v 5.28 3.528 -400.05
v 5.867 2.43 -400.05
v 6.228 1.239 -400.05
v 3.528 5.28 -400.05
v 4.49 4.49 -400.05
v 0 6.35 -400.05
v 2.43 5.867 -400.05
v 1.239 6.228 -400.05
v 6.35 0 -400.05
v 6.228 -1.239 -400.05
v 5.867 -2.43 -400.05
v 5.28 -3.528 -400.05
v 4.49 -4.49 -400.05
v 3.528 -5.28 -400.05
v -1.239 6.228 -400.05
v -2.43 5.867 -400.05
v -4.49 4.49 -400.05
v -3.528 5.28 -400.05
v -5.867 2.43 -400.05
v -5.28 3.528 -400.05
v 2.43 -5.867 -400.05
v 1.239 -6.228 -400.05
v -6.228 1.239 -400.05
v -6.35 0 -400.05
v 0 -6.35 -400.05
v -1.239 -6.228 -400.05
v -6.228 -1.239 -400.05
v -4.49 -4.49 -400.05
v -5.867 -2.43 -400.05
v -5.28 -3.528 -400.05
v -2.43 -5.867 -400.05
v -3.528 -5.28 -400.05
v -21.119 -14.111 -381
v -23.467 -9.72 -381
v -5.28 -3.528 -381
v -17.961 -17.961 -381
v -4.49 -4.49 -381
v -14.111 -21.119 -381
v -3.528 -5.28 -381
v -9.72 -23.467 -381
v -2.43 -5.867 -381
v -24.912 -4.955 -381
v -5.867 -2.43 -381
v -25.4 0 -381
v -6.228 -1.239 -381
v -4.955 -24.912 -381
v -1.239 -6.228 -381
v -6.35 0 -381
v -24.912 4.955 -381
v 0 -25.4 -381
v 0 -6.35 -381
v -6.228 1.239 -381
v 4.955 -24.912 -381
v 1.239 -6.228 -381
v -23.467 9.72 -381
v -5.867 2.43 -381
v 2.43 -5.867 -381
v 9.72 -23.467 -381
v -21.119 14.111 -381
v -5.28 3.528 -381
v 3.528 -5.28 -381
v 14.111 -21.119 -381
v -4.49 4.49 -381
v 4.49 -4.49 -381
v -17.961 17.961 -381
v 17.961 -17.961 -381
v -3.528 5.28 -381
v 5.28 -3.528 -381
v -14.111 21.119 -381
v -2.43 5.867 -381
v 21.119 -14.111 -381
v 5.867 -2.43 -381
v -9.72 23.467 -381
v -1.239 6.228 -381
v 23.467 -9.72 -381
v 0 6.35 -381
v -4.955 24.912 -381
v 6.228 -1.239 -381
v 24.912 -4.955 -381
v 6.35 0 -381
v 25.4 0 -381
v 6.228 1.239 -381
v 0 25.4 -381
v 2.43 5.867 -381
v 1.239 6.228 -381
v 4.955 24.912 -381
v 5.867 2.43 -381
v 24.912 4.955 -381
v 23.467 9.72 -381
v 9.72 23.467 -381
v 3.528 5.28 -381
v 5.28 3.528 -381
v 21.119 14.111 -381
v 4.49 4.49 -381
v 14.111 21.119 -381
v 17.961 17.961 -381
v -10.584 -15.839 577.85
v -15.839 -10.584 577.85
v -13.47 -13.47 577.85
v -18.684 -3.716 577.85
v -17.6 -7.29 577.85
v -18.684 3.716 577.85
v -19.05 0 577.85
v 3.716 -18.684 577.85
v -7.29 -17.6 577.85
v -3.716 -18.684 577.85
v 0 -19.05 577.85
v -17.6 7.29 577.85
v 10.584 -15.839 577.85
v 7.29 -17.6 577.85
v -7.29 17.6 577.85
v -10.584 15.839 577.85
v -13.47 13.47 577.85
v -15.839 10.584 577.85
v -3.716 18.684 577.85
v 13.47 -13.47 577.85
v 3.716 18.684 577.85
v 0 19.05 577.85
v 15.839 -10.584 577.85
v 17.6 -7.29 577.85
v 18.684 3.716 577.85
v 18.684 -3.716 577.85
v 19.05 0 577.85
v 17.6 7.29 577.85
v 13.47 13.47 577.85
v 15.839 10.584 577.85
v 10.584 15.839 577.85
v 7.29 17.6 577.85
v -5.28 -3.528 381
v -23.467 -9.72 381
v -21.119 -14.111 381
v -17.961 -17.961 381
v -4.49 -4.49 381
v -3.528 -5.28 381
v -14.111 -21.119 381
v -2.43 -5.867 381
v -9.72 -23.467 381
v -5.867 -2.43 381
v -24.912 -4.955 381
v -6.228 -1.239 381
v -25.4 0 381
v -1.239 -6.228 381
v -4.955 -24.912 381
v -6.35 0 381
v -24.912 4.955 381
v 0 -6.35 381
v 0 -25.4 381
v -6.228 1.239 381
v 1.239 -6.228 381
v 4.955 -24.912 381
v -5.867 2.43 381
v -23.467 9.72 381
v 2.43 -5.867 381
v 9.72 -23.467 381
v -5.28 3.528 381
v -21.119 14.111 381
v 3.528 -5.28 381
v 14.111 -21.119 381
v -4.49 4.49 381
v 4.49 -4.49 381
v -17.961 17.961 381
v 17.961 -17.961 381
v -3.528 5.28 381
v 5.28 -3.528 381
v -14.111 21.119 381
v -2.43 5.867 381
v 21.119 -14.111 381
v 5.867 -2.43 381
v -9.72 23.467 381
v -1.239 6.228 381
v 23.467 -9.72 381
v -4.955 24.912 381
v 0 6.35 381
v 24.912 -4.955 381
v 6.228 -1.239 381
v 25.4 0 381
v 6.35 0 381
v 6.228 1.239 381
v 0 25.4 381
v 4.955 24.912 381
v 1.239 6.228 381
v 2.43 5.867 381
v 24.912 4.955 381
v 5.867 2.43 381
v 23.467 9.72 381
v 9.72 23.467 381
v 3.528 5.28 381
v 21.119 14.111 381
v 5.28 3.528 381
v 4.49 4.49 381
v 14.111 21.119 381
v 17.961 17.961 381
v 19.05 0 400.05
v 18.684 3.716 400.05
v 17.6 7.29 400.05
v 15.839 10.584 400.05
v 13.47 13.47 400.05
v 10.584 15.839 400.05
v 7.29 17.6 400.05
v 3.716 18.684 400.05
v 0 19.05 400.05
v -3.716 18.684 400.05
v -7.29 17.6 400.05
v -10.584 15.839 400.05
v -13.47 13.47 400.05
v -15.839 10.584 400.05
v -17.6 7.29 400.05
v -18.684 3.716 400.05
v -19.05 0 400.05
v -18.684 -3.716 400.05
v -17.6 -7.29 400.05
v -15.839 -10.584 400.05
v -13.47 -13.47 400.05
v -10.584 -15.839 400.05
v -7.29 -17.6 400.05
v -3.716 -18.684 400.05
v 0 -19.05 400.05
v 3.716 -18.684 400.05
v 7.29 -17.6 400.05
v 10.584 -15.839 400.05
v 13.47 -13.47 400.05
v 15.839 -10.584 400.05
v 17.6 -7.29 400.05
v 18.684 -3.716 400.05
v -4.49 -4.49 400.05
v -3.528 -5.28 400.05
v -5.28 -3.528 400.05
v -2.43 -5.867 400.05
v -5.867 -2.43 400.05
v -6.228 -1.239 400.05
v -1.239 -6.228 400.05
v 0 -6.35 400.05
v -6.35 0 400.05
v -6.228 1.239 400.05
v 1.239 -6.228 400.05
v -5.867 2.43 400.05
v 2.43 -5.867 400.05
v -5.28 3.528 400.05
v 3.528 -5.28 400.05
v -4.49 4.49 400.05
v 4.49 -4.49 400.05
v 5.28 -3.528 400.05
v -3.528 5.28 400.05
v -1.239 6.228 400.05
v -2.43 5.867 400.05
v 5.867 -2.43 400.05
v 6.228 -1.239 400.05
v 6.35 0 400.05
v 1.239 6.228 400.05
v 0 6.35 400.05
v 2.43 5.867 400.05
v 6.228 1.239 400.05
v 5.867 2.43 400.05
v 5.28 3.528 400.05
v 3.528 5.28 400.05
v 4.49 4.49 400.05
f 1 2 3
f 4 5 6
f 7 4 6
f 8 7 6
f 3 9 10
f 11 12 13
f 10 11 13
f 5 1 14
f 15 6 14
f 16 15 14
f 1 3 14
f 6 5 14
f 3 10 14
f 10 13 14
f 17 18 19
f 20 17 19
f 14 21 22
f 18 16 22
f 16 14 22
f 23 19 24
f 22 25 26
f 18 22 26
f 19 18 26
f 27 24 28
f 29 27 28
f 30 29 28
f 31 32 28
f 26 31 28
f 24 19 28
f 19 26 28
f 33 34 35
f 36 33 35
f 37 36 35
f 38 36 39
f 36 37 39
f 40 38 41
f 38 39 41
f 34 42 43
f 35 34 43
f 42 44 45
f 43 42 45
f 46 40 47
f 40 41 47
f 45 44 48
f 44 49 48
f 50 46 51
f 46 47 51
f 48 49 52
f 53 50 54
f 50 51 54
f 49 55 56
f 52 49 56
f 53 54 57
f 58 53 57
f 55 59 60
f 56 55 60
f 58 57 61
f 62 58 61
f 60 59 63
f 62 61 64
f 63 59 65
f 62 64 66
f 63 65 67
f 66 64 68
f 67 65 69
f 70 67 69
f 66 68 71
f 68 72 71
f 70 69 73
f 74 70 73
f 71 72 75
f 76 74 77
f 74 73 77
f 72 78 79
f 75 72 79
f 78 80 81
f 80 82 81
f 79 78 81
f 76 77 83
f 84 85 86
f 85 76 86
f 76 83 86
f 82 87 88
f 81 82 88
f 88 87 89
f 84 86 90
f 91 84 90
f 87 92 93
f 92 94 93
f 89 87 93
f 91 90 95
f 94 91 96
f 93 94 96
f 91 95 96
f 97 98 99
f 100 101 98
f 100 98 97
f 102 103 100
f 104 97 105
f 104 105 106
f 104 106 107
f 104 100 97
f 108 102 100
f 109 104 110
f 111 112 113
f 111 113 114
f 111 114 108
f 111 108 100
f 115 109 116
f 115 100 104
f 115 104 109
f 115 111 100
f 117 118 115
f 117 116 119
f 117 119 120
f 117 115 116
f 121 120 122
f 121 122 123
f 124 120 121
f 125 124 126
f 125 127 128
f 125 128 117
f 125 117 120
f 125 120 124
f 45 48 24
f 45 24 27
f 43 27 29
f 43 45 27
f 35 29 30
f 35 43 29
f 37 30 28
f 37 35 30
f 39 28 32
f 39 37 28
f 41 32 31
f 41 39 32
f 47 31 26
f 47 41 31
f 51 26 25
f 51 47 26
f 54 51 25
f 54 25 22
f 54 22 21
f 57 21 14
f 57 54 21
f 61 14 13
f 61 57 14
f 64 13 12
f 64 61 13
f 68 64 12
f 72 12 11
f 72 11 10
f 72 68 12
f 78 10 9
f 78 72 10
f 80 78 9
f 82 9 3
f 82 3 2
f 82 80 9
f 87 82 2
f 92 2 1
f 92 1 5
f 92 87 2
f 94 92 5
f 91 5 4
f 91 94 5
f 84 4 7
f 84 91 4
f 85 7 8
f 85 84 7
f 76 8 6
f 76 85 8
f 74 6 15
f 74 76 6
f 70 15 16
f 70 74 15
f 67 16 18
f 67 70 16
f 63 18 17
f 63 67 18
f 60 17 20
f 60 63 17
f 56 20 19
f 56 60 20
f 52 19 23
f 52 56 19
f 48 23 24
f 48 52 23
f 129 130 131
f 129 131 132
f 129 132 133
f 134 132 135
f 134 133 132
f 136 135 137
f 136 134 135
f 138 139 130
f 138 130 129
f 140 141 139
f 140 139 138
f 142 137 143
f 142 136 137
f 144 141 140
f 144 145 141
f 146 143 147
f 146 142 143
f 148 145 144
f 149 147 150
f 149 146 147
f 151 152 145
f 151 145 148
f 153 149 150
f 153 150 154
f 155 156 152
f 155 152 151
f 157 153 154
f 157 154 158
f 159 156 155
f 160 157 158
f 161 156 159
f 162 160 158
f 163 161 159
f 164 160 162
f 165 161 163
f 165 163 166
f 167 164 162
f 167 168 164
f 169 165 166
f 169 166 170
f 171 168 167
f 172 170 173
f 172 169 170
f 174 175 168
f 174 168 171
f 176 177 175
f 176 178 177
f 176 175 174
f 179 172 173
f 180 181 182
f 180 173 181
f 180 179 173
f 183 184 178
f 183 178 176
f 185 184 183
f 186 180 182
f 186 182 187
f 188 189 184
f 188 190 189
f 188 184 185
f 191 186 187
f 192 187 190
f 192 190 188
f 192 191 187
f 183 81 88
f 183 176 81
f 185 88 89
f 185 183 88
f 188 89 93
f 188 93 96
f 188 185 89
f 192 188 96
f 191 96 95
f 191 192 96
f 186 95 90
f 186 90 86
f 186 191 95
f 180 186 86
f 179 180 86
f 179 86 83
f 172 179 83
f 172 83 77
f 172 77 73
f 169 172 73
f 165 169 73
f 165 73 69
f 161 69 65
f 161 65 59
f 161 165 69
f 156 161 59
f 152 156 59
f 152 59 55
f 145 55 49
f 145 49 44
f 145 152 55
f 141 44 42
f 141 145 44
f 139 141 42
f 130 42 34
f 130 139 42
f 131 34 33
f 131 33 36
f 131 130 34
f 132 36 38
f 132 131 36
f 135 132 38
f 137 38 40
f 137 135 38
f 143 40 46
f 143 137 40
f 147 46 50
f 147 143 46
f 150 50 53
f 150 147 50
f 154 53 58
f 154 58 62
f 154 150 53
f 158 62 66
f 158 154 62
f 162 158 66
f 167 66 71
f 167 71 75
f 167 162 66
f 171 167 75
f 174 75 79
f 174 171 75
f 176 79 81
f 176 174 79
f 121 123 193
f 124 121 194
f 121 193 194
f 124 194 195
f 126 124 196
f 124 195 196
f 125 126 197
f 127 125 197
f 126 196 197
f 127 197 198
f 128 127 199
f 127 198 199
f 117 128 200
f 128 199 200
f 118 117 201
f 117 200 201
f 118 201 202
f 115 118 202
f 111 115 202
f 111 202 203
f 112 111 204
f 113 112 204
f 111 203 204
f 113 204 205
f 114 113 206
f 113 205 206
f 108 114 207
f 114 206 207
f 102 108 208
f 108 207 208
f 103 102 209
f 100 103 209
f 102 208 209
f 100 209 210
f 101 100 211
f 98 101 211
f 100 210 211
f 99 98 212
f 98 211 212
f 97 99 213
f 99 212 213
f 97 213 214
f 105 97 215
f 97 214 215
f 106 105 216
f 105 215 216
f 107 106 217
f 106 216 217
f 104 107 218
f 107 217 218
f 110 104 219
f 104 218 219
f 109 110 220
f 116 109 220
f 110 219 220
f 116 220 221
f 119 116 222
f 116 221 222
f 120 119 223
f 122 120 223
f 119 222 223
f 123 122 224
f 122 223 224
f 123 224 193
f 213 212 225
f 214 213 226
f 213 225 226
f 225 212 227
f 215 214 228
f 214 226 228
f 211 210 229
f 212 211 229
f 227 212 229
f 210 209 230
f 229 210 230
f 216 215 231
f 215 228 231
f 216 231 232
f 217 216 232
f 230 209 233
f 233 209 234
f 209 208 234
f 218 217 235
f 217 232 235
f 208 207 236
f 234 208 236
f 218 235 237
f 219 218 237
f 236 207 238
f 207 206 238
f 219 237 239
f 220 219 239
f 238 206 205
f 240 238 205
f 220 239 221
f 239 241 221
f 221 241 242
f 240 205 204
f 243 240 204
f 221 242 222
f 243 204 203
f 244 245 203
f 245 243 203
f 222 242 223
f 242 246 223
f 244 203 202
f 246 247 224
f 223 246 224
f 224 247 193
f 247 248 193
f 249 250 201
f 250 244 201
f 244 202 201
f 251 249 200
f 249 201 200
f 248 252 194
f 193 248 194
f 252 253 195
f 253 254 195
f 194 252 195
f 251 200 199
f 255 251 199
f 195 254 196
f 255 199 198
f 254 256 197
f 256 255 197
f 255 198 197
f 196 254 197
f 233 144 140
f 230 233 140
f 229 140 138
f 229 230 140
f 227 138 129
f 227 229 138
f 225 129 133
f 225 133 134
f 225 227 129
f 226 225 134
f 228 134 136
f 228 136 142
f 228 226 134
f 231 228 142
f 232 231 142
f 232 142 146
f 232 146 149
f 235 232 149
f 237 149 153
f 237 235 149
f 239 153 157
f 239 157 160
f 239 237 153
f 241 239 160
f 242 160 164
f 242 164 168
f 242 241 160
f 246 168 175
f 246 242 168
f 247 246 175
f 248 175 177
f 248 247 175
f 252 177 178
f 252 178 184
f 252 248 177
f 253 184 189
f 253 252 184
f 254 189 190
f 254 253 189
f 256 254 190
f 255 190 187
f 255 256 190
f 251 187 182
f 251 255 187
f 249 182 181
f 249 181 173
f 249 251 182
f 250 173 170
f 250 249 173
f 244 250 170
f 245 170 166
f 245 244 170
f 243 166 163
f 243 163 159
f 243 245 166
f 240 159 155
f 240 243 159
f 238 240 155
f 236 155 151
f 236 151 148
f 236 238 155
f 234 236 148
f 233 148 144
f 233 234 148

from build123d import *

# Parameters (mm, degrees)
SKETCH1_R           = 6.35
BOSS_EXTRUDE1_DEPTH = 400.05
SKETCH1_3_R         = 25.4
SKETCH1_3_R_2       = 6.35
BOSS_EXTRUDE2_DEPTH = 381
BOSS_EXTRUDE3_START = 19.05
SKETCH3_R           = 19.05
BOSS_EXTRUDE3_DEPTH = 177.8


with BuildPart() as part:
    # Sketch1 → Boss-Extrude1 (new, symmetric)
    with BuildSketch(Plane.XY):
        Circle(SKETCH1_R)
    extrude(amount=BOSS_EXTRUDE1_DEPTH, both=True)

    # Sketch1<3> → Boss-Extrude2 (add, symmetric)
    with BuildSketch(Plane.XY):
        Circle(SKETCH1_3_R)
        Circle(SKETCH1_3_R_2, mode=Mode.SUBTRACT)
    extrude(amount=BOSS_EXTRUDE2_DEPTH, both=True)

    # Sketch3 → Boss-Extrude3 (add)
    with BuildSketch(Plane.XY.offset(381).offset(BOSS_EXTRUDE3_START)):
        Circle(SKETCH3_R)
    extrude(amount=BOSS_EXTRUDE3_DEPTH)


solid = part.part
